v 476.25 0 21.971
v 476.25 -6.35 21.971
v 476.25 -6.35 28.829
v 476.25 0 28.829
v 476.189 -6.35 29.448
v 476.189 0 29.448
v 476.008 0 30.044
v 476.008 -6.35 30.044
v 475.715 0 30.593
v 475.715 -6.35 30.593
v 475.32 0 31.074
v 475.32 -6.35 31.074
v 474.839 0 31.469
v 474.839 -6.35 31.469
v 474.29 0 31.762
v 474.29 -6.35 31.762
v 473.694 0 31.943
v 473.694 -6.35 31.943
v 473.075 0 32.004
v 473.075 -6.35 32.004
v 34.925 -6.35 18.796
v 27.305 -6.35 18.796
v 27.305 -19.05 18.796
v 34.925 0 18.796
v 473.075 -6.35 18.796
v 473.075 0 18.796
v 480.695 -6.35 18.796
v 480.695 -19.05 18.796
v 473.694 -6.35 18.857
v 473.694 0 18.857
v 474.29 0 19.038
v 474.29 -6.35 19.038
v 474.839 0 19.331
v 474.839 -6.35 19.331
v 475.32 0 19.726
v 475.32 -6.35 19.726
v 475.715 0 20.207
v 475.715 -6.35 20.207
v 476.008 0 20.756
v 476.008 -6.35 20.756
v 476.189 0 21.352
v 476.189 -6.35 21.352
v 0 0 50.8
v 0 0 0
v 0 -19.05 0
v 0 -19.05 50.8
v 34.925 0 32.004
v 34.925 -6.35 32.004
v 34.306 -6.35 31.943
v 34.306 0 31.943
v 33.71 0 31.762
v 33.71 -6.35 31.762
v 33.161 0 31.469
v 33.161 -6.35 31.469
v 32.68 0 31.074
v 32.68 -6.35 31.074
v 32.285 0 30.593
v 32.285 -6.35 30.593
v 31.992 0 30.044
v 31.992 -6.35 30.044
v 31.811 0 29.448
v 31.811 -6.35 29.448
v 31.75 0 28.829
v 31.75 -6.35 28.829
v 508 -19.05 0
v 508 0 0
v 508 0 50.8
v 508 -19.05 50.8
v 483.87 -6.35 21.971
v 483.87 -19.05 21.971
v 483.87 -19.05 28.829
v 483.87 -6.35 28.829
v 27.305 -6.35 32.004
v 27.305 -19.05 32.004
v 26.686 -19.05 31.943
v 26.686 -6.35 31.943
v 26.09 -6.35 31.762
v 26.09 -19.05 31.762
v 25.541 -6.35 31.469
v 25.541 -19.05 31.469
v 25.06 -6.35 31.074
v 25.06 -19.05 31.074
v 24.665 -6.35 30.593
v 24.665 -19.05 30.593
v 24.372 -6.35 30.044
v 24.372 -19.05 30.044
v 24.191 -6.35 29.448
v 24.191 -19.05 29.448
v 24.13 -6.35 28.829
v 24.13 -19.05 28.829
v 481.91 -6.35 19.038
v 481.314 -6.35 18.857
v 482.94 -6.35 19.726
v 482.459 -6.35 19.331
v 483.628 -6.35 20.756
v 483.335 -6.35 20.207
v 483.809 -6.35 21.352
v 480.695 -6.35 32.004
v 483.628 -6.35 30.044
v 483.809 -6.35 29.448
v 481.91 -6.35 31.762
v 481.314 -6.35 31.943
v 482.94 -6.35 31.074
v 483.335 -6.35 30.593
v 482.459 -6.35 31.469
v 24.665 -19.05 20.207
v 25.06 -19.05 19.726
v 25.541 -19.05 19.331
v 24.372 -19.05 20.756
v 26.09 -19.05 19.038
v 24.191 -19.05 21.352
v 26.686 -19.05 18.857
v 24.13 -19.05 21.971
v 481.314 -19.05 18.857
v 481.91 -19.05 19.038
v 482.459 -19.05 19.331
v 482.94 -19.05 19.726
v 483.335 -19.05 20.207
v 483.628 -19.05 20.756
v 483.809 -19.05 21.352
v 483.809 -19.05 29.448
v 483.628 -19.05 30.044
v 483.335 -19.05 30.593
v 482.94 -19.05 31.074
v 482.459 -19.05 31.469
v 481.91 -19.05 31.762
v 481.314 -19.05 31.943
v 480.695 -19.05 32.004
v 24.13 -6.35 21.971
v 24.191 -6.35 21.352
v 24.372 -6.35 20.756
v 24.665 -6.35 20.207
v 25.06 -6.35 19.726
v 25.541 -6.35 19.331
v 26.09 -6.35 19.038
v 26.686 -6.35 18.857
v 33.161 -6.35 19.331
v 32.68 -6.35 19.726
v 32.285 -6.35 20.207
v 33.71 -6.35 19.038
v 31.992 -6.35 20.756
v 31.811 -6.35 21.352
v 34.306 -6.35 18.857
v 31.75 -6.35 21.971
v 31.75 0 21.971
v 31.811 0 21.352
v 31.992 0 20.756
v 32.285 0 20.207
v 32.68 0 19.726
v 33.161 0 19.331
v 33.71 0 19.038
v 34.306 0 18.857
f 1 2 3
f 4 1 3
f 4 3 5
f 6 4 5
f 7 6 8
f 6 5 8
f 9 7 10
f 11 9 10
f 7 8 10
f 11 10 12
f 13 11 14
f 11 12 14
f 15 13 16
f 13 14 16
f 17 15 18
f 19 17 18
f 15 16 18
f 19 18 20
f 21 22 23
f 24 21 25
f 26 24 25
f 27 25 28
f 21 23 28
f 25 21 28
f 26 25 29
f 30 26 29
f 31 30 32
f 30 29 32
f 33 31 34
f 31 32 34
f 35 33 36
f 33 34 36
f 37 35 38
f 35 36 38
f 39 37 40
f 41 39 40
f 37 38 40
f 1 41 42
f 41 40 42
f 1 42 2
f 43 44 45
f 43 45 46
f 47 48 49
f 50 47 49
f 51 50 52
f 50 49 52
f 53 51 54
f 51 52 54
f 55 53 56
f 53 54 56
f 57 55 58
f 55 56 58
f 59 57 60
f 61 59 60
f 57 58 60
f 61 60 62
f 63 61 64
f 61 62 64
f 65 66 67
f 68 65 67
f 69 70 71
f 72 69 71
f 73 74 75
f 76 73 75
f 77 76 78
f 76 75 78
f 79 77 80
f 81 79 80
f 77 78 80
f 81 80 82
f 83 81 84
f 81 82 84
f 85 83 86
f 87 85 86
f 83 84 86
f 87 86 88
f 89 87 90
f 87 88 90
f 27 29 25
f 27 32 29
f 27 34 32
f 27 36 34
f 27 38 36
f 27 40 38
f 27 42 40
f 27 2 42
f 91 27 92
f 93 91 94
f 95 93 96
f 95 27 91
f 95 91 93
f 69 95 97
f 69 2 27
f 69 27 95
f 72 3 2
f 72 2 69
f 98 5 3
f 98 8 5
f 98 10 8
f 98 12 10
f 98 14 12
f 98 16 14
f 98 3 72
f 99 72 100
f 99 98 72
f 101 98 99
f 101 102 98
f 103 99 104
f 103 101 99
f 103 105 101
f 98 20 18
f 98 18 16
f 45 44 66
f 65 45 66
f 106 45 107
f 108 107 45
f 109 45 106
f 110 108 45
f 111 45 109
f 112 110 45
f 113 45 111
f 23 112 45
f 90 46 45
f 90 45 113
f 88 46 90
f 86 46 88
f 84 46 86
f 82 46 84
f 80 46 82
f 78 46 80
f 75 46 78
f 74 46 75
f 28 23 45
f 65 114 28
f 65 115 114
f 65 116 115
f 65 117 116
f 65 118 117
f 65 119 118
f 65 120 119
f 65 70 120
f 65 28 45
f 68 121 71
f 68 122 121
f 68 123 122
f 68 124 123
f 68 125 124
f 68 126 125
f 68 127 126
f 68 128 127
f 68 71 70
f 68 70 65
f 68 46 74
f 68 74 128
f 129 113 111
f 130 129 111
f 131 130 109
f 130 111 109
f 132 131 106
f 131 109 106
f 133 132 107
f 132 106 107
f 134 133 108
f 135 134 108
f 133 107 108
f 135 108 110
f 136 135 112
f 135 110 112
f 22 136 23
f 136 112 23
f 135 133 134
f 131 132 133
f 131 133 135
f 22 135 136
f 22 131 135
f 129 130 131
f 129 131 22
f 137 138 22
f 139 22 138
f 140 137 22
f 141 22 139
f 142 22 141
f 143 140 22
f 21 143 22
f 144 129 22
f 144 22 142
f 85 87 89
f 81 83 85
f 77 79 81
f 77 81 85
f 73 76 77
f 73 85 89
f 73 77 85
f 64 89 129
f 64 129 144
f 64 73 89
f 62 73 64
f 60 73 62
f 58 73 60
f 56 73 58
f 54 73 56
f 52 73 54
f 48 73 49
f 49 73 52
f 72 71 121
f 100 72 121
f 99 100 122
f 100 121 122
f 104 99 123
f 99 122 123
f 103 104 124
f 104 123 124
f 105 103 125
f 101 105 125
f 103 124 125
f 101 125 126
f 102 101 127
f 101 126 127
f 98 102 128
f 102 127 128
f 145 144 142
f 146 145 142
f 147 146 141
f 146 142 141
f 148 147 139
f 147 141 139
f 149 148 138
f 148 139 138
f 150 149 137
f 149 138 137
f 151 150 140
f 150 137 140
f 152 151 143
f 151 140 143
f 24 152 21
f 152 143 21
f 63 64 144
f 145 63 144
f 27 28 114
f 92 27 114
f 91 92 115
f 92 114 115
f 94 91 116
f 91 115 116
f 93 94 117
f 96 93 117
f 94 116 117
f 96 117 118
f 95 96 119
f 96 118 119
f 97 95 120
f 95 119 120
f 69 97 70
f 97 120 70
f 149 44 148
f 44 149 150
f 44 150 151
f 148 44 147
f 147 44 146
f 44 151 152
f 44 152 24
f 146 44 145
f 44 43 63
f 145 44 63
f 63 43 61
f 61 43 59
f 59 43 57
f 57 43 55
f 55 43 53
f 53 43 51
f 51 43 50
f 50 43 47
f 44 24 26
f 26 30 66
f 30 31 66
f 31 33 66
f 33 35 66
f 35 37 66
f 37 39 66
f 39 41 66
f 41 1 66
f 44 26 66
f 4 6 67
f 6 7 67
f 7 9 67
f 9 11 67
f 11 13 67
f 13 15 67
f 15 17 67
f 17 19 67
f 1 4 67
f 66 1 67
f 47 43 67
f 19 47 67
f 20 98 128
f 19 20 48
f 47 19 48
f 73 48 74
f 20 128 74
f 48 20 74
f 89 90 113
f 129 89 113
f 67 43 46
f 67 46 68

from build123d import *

# Parameters (mm, degrees)
F0_W     = 508
F0_H     = 50.8
F1_DEPTH = 19.05
F3_DEPTH = 12.7
F5_DEPTH = 25.4


with BuildPart() as f1:
    # F0 (on Front) → F1 (new body)
    with BuildSketch(Plane.XZ):
        with Locations((254, 25.4)):
            Rectangle(F0_W, F0_H)
    extrude(amount=F1_DEPTH)

    # F2 (on face) → F3 (cut)
    with BuildSketch(Plane.XZ.offset(19.05)):
        with BuildLine():
            Line((480.695, 32.004), (27.305, 32.004))
            ThreePointArc((27.305, 32.004), (25.059936, 31.074064), (24.13, 28.829))
            Line((24.13, 28.829), (24.13, 21.971))
            ThreePointArc((24.13, 21.971), (25.059936, 19.725936), (27.305, 18.796))
            Line((27.305, 18.796), (480.695, 18.796))
            ThreePointArc((480.695, 18.796), (482.940064, 19.725936), (483.87, 21.971))
            Line((483.87, 21.971), (483.87, 28.829))
            ThreePointArc((483.87, 28.829), (482.940064, 31.074064), (480.695, 32.004))
        make_face()
    extrude(amount=-F3_DEPTH, mode=Mode.SUBTRACT)

    # F4 (on face) → F5 (cut)
    with BuildSketch(Plane.XZ.offset(19.05)):
        with BuildLine():
            Line((473.075, 32.004), (34.925, 32.004))
            ThreePointArc((34.925, 32.004), (32.679936, 31.074064), (31.75, 28.829))
            Line((31.75, 28.829), (31.75, 21.971))
            ThreePointArc((31.75, 21.971), (32.679936, 19.725936), (34.925, 18.796))
            Line((34.925, 18.796), (473.075, 18.796))
            ThreePointArc((473.075, 18.796), (475.320064, 19.725936), (476.25, 21.971))
            Line((476.25, 21.971), (476.25, 28.829))
            ThreePointArc((476.25, 28.829), (475.320064, 31.074064), (473.075, 32.004))
        make_face()
    extrude(amount=-F5_DEPTH, mode=Mode.SUBTRACT)


solid = f1.part
